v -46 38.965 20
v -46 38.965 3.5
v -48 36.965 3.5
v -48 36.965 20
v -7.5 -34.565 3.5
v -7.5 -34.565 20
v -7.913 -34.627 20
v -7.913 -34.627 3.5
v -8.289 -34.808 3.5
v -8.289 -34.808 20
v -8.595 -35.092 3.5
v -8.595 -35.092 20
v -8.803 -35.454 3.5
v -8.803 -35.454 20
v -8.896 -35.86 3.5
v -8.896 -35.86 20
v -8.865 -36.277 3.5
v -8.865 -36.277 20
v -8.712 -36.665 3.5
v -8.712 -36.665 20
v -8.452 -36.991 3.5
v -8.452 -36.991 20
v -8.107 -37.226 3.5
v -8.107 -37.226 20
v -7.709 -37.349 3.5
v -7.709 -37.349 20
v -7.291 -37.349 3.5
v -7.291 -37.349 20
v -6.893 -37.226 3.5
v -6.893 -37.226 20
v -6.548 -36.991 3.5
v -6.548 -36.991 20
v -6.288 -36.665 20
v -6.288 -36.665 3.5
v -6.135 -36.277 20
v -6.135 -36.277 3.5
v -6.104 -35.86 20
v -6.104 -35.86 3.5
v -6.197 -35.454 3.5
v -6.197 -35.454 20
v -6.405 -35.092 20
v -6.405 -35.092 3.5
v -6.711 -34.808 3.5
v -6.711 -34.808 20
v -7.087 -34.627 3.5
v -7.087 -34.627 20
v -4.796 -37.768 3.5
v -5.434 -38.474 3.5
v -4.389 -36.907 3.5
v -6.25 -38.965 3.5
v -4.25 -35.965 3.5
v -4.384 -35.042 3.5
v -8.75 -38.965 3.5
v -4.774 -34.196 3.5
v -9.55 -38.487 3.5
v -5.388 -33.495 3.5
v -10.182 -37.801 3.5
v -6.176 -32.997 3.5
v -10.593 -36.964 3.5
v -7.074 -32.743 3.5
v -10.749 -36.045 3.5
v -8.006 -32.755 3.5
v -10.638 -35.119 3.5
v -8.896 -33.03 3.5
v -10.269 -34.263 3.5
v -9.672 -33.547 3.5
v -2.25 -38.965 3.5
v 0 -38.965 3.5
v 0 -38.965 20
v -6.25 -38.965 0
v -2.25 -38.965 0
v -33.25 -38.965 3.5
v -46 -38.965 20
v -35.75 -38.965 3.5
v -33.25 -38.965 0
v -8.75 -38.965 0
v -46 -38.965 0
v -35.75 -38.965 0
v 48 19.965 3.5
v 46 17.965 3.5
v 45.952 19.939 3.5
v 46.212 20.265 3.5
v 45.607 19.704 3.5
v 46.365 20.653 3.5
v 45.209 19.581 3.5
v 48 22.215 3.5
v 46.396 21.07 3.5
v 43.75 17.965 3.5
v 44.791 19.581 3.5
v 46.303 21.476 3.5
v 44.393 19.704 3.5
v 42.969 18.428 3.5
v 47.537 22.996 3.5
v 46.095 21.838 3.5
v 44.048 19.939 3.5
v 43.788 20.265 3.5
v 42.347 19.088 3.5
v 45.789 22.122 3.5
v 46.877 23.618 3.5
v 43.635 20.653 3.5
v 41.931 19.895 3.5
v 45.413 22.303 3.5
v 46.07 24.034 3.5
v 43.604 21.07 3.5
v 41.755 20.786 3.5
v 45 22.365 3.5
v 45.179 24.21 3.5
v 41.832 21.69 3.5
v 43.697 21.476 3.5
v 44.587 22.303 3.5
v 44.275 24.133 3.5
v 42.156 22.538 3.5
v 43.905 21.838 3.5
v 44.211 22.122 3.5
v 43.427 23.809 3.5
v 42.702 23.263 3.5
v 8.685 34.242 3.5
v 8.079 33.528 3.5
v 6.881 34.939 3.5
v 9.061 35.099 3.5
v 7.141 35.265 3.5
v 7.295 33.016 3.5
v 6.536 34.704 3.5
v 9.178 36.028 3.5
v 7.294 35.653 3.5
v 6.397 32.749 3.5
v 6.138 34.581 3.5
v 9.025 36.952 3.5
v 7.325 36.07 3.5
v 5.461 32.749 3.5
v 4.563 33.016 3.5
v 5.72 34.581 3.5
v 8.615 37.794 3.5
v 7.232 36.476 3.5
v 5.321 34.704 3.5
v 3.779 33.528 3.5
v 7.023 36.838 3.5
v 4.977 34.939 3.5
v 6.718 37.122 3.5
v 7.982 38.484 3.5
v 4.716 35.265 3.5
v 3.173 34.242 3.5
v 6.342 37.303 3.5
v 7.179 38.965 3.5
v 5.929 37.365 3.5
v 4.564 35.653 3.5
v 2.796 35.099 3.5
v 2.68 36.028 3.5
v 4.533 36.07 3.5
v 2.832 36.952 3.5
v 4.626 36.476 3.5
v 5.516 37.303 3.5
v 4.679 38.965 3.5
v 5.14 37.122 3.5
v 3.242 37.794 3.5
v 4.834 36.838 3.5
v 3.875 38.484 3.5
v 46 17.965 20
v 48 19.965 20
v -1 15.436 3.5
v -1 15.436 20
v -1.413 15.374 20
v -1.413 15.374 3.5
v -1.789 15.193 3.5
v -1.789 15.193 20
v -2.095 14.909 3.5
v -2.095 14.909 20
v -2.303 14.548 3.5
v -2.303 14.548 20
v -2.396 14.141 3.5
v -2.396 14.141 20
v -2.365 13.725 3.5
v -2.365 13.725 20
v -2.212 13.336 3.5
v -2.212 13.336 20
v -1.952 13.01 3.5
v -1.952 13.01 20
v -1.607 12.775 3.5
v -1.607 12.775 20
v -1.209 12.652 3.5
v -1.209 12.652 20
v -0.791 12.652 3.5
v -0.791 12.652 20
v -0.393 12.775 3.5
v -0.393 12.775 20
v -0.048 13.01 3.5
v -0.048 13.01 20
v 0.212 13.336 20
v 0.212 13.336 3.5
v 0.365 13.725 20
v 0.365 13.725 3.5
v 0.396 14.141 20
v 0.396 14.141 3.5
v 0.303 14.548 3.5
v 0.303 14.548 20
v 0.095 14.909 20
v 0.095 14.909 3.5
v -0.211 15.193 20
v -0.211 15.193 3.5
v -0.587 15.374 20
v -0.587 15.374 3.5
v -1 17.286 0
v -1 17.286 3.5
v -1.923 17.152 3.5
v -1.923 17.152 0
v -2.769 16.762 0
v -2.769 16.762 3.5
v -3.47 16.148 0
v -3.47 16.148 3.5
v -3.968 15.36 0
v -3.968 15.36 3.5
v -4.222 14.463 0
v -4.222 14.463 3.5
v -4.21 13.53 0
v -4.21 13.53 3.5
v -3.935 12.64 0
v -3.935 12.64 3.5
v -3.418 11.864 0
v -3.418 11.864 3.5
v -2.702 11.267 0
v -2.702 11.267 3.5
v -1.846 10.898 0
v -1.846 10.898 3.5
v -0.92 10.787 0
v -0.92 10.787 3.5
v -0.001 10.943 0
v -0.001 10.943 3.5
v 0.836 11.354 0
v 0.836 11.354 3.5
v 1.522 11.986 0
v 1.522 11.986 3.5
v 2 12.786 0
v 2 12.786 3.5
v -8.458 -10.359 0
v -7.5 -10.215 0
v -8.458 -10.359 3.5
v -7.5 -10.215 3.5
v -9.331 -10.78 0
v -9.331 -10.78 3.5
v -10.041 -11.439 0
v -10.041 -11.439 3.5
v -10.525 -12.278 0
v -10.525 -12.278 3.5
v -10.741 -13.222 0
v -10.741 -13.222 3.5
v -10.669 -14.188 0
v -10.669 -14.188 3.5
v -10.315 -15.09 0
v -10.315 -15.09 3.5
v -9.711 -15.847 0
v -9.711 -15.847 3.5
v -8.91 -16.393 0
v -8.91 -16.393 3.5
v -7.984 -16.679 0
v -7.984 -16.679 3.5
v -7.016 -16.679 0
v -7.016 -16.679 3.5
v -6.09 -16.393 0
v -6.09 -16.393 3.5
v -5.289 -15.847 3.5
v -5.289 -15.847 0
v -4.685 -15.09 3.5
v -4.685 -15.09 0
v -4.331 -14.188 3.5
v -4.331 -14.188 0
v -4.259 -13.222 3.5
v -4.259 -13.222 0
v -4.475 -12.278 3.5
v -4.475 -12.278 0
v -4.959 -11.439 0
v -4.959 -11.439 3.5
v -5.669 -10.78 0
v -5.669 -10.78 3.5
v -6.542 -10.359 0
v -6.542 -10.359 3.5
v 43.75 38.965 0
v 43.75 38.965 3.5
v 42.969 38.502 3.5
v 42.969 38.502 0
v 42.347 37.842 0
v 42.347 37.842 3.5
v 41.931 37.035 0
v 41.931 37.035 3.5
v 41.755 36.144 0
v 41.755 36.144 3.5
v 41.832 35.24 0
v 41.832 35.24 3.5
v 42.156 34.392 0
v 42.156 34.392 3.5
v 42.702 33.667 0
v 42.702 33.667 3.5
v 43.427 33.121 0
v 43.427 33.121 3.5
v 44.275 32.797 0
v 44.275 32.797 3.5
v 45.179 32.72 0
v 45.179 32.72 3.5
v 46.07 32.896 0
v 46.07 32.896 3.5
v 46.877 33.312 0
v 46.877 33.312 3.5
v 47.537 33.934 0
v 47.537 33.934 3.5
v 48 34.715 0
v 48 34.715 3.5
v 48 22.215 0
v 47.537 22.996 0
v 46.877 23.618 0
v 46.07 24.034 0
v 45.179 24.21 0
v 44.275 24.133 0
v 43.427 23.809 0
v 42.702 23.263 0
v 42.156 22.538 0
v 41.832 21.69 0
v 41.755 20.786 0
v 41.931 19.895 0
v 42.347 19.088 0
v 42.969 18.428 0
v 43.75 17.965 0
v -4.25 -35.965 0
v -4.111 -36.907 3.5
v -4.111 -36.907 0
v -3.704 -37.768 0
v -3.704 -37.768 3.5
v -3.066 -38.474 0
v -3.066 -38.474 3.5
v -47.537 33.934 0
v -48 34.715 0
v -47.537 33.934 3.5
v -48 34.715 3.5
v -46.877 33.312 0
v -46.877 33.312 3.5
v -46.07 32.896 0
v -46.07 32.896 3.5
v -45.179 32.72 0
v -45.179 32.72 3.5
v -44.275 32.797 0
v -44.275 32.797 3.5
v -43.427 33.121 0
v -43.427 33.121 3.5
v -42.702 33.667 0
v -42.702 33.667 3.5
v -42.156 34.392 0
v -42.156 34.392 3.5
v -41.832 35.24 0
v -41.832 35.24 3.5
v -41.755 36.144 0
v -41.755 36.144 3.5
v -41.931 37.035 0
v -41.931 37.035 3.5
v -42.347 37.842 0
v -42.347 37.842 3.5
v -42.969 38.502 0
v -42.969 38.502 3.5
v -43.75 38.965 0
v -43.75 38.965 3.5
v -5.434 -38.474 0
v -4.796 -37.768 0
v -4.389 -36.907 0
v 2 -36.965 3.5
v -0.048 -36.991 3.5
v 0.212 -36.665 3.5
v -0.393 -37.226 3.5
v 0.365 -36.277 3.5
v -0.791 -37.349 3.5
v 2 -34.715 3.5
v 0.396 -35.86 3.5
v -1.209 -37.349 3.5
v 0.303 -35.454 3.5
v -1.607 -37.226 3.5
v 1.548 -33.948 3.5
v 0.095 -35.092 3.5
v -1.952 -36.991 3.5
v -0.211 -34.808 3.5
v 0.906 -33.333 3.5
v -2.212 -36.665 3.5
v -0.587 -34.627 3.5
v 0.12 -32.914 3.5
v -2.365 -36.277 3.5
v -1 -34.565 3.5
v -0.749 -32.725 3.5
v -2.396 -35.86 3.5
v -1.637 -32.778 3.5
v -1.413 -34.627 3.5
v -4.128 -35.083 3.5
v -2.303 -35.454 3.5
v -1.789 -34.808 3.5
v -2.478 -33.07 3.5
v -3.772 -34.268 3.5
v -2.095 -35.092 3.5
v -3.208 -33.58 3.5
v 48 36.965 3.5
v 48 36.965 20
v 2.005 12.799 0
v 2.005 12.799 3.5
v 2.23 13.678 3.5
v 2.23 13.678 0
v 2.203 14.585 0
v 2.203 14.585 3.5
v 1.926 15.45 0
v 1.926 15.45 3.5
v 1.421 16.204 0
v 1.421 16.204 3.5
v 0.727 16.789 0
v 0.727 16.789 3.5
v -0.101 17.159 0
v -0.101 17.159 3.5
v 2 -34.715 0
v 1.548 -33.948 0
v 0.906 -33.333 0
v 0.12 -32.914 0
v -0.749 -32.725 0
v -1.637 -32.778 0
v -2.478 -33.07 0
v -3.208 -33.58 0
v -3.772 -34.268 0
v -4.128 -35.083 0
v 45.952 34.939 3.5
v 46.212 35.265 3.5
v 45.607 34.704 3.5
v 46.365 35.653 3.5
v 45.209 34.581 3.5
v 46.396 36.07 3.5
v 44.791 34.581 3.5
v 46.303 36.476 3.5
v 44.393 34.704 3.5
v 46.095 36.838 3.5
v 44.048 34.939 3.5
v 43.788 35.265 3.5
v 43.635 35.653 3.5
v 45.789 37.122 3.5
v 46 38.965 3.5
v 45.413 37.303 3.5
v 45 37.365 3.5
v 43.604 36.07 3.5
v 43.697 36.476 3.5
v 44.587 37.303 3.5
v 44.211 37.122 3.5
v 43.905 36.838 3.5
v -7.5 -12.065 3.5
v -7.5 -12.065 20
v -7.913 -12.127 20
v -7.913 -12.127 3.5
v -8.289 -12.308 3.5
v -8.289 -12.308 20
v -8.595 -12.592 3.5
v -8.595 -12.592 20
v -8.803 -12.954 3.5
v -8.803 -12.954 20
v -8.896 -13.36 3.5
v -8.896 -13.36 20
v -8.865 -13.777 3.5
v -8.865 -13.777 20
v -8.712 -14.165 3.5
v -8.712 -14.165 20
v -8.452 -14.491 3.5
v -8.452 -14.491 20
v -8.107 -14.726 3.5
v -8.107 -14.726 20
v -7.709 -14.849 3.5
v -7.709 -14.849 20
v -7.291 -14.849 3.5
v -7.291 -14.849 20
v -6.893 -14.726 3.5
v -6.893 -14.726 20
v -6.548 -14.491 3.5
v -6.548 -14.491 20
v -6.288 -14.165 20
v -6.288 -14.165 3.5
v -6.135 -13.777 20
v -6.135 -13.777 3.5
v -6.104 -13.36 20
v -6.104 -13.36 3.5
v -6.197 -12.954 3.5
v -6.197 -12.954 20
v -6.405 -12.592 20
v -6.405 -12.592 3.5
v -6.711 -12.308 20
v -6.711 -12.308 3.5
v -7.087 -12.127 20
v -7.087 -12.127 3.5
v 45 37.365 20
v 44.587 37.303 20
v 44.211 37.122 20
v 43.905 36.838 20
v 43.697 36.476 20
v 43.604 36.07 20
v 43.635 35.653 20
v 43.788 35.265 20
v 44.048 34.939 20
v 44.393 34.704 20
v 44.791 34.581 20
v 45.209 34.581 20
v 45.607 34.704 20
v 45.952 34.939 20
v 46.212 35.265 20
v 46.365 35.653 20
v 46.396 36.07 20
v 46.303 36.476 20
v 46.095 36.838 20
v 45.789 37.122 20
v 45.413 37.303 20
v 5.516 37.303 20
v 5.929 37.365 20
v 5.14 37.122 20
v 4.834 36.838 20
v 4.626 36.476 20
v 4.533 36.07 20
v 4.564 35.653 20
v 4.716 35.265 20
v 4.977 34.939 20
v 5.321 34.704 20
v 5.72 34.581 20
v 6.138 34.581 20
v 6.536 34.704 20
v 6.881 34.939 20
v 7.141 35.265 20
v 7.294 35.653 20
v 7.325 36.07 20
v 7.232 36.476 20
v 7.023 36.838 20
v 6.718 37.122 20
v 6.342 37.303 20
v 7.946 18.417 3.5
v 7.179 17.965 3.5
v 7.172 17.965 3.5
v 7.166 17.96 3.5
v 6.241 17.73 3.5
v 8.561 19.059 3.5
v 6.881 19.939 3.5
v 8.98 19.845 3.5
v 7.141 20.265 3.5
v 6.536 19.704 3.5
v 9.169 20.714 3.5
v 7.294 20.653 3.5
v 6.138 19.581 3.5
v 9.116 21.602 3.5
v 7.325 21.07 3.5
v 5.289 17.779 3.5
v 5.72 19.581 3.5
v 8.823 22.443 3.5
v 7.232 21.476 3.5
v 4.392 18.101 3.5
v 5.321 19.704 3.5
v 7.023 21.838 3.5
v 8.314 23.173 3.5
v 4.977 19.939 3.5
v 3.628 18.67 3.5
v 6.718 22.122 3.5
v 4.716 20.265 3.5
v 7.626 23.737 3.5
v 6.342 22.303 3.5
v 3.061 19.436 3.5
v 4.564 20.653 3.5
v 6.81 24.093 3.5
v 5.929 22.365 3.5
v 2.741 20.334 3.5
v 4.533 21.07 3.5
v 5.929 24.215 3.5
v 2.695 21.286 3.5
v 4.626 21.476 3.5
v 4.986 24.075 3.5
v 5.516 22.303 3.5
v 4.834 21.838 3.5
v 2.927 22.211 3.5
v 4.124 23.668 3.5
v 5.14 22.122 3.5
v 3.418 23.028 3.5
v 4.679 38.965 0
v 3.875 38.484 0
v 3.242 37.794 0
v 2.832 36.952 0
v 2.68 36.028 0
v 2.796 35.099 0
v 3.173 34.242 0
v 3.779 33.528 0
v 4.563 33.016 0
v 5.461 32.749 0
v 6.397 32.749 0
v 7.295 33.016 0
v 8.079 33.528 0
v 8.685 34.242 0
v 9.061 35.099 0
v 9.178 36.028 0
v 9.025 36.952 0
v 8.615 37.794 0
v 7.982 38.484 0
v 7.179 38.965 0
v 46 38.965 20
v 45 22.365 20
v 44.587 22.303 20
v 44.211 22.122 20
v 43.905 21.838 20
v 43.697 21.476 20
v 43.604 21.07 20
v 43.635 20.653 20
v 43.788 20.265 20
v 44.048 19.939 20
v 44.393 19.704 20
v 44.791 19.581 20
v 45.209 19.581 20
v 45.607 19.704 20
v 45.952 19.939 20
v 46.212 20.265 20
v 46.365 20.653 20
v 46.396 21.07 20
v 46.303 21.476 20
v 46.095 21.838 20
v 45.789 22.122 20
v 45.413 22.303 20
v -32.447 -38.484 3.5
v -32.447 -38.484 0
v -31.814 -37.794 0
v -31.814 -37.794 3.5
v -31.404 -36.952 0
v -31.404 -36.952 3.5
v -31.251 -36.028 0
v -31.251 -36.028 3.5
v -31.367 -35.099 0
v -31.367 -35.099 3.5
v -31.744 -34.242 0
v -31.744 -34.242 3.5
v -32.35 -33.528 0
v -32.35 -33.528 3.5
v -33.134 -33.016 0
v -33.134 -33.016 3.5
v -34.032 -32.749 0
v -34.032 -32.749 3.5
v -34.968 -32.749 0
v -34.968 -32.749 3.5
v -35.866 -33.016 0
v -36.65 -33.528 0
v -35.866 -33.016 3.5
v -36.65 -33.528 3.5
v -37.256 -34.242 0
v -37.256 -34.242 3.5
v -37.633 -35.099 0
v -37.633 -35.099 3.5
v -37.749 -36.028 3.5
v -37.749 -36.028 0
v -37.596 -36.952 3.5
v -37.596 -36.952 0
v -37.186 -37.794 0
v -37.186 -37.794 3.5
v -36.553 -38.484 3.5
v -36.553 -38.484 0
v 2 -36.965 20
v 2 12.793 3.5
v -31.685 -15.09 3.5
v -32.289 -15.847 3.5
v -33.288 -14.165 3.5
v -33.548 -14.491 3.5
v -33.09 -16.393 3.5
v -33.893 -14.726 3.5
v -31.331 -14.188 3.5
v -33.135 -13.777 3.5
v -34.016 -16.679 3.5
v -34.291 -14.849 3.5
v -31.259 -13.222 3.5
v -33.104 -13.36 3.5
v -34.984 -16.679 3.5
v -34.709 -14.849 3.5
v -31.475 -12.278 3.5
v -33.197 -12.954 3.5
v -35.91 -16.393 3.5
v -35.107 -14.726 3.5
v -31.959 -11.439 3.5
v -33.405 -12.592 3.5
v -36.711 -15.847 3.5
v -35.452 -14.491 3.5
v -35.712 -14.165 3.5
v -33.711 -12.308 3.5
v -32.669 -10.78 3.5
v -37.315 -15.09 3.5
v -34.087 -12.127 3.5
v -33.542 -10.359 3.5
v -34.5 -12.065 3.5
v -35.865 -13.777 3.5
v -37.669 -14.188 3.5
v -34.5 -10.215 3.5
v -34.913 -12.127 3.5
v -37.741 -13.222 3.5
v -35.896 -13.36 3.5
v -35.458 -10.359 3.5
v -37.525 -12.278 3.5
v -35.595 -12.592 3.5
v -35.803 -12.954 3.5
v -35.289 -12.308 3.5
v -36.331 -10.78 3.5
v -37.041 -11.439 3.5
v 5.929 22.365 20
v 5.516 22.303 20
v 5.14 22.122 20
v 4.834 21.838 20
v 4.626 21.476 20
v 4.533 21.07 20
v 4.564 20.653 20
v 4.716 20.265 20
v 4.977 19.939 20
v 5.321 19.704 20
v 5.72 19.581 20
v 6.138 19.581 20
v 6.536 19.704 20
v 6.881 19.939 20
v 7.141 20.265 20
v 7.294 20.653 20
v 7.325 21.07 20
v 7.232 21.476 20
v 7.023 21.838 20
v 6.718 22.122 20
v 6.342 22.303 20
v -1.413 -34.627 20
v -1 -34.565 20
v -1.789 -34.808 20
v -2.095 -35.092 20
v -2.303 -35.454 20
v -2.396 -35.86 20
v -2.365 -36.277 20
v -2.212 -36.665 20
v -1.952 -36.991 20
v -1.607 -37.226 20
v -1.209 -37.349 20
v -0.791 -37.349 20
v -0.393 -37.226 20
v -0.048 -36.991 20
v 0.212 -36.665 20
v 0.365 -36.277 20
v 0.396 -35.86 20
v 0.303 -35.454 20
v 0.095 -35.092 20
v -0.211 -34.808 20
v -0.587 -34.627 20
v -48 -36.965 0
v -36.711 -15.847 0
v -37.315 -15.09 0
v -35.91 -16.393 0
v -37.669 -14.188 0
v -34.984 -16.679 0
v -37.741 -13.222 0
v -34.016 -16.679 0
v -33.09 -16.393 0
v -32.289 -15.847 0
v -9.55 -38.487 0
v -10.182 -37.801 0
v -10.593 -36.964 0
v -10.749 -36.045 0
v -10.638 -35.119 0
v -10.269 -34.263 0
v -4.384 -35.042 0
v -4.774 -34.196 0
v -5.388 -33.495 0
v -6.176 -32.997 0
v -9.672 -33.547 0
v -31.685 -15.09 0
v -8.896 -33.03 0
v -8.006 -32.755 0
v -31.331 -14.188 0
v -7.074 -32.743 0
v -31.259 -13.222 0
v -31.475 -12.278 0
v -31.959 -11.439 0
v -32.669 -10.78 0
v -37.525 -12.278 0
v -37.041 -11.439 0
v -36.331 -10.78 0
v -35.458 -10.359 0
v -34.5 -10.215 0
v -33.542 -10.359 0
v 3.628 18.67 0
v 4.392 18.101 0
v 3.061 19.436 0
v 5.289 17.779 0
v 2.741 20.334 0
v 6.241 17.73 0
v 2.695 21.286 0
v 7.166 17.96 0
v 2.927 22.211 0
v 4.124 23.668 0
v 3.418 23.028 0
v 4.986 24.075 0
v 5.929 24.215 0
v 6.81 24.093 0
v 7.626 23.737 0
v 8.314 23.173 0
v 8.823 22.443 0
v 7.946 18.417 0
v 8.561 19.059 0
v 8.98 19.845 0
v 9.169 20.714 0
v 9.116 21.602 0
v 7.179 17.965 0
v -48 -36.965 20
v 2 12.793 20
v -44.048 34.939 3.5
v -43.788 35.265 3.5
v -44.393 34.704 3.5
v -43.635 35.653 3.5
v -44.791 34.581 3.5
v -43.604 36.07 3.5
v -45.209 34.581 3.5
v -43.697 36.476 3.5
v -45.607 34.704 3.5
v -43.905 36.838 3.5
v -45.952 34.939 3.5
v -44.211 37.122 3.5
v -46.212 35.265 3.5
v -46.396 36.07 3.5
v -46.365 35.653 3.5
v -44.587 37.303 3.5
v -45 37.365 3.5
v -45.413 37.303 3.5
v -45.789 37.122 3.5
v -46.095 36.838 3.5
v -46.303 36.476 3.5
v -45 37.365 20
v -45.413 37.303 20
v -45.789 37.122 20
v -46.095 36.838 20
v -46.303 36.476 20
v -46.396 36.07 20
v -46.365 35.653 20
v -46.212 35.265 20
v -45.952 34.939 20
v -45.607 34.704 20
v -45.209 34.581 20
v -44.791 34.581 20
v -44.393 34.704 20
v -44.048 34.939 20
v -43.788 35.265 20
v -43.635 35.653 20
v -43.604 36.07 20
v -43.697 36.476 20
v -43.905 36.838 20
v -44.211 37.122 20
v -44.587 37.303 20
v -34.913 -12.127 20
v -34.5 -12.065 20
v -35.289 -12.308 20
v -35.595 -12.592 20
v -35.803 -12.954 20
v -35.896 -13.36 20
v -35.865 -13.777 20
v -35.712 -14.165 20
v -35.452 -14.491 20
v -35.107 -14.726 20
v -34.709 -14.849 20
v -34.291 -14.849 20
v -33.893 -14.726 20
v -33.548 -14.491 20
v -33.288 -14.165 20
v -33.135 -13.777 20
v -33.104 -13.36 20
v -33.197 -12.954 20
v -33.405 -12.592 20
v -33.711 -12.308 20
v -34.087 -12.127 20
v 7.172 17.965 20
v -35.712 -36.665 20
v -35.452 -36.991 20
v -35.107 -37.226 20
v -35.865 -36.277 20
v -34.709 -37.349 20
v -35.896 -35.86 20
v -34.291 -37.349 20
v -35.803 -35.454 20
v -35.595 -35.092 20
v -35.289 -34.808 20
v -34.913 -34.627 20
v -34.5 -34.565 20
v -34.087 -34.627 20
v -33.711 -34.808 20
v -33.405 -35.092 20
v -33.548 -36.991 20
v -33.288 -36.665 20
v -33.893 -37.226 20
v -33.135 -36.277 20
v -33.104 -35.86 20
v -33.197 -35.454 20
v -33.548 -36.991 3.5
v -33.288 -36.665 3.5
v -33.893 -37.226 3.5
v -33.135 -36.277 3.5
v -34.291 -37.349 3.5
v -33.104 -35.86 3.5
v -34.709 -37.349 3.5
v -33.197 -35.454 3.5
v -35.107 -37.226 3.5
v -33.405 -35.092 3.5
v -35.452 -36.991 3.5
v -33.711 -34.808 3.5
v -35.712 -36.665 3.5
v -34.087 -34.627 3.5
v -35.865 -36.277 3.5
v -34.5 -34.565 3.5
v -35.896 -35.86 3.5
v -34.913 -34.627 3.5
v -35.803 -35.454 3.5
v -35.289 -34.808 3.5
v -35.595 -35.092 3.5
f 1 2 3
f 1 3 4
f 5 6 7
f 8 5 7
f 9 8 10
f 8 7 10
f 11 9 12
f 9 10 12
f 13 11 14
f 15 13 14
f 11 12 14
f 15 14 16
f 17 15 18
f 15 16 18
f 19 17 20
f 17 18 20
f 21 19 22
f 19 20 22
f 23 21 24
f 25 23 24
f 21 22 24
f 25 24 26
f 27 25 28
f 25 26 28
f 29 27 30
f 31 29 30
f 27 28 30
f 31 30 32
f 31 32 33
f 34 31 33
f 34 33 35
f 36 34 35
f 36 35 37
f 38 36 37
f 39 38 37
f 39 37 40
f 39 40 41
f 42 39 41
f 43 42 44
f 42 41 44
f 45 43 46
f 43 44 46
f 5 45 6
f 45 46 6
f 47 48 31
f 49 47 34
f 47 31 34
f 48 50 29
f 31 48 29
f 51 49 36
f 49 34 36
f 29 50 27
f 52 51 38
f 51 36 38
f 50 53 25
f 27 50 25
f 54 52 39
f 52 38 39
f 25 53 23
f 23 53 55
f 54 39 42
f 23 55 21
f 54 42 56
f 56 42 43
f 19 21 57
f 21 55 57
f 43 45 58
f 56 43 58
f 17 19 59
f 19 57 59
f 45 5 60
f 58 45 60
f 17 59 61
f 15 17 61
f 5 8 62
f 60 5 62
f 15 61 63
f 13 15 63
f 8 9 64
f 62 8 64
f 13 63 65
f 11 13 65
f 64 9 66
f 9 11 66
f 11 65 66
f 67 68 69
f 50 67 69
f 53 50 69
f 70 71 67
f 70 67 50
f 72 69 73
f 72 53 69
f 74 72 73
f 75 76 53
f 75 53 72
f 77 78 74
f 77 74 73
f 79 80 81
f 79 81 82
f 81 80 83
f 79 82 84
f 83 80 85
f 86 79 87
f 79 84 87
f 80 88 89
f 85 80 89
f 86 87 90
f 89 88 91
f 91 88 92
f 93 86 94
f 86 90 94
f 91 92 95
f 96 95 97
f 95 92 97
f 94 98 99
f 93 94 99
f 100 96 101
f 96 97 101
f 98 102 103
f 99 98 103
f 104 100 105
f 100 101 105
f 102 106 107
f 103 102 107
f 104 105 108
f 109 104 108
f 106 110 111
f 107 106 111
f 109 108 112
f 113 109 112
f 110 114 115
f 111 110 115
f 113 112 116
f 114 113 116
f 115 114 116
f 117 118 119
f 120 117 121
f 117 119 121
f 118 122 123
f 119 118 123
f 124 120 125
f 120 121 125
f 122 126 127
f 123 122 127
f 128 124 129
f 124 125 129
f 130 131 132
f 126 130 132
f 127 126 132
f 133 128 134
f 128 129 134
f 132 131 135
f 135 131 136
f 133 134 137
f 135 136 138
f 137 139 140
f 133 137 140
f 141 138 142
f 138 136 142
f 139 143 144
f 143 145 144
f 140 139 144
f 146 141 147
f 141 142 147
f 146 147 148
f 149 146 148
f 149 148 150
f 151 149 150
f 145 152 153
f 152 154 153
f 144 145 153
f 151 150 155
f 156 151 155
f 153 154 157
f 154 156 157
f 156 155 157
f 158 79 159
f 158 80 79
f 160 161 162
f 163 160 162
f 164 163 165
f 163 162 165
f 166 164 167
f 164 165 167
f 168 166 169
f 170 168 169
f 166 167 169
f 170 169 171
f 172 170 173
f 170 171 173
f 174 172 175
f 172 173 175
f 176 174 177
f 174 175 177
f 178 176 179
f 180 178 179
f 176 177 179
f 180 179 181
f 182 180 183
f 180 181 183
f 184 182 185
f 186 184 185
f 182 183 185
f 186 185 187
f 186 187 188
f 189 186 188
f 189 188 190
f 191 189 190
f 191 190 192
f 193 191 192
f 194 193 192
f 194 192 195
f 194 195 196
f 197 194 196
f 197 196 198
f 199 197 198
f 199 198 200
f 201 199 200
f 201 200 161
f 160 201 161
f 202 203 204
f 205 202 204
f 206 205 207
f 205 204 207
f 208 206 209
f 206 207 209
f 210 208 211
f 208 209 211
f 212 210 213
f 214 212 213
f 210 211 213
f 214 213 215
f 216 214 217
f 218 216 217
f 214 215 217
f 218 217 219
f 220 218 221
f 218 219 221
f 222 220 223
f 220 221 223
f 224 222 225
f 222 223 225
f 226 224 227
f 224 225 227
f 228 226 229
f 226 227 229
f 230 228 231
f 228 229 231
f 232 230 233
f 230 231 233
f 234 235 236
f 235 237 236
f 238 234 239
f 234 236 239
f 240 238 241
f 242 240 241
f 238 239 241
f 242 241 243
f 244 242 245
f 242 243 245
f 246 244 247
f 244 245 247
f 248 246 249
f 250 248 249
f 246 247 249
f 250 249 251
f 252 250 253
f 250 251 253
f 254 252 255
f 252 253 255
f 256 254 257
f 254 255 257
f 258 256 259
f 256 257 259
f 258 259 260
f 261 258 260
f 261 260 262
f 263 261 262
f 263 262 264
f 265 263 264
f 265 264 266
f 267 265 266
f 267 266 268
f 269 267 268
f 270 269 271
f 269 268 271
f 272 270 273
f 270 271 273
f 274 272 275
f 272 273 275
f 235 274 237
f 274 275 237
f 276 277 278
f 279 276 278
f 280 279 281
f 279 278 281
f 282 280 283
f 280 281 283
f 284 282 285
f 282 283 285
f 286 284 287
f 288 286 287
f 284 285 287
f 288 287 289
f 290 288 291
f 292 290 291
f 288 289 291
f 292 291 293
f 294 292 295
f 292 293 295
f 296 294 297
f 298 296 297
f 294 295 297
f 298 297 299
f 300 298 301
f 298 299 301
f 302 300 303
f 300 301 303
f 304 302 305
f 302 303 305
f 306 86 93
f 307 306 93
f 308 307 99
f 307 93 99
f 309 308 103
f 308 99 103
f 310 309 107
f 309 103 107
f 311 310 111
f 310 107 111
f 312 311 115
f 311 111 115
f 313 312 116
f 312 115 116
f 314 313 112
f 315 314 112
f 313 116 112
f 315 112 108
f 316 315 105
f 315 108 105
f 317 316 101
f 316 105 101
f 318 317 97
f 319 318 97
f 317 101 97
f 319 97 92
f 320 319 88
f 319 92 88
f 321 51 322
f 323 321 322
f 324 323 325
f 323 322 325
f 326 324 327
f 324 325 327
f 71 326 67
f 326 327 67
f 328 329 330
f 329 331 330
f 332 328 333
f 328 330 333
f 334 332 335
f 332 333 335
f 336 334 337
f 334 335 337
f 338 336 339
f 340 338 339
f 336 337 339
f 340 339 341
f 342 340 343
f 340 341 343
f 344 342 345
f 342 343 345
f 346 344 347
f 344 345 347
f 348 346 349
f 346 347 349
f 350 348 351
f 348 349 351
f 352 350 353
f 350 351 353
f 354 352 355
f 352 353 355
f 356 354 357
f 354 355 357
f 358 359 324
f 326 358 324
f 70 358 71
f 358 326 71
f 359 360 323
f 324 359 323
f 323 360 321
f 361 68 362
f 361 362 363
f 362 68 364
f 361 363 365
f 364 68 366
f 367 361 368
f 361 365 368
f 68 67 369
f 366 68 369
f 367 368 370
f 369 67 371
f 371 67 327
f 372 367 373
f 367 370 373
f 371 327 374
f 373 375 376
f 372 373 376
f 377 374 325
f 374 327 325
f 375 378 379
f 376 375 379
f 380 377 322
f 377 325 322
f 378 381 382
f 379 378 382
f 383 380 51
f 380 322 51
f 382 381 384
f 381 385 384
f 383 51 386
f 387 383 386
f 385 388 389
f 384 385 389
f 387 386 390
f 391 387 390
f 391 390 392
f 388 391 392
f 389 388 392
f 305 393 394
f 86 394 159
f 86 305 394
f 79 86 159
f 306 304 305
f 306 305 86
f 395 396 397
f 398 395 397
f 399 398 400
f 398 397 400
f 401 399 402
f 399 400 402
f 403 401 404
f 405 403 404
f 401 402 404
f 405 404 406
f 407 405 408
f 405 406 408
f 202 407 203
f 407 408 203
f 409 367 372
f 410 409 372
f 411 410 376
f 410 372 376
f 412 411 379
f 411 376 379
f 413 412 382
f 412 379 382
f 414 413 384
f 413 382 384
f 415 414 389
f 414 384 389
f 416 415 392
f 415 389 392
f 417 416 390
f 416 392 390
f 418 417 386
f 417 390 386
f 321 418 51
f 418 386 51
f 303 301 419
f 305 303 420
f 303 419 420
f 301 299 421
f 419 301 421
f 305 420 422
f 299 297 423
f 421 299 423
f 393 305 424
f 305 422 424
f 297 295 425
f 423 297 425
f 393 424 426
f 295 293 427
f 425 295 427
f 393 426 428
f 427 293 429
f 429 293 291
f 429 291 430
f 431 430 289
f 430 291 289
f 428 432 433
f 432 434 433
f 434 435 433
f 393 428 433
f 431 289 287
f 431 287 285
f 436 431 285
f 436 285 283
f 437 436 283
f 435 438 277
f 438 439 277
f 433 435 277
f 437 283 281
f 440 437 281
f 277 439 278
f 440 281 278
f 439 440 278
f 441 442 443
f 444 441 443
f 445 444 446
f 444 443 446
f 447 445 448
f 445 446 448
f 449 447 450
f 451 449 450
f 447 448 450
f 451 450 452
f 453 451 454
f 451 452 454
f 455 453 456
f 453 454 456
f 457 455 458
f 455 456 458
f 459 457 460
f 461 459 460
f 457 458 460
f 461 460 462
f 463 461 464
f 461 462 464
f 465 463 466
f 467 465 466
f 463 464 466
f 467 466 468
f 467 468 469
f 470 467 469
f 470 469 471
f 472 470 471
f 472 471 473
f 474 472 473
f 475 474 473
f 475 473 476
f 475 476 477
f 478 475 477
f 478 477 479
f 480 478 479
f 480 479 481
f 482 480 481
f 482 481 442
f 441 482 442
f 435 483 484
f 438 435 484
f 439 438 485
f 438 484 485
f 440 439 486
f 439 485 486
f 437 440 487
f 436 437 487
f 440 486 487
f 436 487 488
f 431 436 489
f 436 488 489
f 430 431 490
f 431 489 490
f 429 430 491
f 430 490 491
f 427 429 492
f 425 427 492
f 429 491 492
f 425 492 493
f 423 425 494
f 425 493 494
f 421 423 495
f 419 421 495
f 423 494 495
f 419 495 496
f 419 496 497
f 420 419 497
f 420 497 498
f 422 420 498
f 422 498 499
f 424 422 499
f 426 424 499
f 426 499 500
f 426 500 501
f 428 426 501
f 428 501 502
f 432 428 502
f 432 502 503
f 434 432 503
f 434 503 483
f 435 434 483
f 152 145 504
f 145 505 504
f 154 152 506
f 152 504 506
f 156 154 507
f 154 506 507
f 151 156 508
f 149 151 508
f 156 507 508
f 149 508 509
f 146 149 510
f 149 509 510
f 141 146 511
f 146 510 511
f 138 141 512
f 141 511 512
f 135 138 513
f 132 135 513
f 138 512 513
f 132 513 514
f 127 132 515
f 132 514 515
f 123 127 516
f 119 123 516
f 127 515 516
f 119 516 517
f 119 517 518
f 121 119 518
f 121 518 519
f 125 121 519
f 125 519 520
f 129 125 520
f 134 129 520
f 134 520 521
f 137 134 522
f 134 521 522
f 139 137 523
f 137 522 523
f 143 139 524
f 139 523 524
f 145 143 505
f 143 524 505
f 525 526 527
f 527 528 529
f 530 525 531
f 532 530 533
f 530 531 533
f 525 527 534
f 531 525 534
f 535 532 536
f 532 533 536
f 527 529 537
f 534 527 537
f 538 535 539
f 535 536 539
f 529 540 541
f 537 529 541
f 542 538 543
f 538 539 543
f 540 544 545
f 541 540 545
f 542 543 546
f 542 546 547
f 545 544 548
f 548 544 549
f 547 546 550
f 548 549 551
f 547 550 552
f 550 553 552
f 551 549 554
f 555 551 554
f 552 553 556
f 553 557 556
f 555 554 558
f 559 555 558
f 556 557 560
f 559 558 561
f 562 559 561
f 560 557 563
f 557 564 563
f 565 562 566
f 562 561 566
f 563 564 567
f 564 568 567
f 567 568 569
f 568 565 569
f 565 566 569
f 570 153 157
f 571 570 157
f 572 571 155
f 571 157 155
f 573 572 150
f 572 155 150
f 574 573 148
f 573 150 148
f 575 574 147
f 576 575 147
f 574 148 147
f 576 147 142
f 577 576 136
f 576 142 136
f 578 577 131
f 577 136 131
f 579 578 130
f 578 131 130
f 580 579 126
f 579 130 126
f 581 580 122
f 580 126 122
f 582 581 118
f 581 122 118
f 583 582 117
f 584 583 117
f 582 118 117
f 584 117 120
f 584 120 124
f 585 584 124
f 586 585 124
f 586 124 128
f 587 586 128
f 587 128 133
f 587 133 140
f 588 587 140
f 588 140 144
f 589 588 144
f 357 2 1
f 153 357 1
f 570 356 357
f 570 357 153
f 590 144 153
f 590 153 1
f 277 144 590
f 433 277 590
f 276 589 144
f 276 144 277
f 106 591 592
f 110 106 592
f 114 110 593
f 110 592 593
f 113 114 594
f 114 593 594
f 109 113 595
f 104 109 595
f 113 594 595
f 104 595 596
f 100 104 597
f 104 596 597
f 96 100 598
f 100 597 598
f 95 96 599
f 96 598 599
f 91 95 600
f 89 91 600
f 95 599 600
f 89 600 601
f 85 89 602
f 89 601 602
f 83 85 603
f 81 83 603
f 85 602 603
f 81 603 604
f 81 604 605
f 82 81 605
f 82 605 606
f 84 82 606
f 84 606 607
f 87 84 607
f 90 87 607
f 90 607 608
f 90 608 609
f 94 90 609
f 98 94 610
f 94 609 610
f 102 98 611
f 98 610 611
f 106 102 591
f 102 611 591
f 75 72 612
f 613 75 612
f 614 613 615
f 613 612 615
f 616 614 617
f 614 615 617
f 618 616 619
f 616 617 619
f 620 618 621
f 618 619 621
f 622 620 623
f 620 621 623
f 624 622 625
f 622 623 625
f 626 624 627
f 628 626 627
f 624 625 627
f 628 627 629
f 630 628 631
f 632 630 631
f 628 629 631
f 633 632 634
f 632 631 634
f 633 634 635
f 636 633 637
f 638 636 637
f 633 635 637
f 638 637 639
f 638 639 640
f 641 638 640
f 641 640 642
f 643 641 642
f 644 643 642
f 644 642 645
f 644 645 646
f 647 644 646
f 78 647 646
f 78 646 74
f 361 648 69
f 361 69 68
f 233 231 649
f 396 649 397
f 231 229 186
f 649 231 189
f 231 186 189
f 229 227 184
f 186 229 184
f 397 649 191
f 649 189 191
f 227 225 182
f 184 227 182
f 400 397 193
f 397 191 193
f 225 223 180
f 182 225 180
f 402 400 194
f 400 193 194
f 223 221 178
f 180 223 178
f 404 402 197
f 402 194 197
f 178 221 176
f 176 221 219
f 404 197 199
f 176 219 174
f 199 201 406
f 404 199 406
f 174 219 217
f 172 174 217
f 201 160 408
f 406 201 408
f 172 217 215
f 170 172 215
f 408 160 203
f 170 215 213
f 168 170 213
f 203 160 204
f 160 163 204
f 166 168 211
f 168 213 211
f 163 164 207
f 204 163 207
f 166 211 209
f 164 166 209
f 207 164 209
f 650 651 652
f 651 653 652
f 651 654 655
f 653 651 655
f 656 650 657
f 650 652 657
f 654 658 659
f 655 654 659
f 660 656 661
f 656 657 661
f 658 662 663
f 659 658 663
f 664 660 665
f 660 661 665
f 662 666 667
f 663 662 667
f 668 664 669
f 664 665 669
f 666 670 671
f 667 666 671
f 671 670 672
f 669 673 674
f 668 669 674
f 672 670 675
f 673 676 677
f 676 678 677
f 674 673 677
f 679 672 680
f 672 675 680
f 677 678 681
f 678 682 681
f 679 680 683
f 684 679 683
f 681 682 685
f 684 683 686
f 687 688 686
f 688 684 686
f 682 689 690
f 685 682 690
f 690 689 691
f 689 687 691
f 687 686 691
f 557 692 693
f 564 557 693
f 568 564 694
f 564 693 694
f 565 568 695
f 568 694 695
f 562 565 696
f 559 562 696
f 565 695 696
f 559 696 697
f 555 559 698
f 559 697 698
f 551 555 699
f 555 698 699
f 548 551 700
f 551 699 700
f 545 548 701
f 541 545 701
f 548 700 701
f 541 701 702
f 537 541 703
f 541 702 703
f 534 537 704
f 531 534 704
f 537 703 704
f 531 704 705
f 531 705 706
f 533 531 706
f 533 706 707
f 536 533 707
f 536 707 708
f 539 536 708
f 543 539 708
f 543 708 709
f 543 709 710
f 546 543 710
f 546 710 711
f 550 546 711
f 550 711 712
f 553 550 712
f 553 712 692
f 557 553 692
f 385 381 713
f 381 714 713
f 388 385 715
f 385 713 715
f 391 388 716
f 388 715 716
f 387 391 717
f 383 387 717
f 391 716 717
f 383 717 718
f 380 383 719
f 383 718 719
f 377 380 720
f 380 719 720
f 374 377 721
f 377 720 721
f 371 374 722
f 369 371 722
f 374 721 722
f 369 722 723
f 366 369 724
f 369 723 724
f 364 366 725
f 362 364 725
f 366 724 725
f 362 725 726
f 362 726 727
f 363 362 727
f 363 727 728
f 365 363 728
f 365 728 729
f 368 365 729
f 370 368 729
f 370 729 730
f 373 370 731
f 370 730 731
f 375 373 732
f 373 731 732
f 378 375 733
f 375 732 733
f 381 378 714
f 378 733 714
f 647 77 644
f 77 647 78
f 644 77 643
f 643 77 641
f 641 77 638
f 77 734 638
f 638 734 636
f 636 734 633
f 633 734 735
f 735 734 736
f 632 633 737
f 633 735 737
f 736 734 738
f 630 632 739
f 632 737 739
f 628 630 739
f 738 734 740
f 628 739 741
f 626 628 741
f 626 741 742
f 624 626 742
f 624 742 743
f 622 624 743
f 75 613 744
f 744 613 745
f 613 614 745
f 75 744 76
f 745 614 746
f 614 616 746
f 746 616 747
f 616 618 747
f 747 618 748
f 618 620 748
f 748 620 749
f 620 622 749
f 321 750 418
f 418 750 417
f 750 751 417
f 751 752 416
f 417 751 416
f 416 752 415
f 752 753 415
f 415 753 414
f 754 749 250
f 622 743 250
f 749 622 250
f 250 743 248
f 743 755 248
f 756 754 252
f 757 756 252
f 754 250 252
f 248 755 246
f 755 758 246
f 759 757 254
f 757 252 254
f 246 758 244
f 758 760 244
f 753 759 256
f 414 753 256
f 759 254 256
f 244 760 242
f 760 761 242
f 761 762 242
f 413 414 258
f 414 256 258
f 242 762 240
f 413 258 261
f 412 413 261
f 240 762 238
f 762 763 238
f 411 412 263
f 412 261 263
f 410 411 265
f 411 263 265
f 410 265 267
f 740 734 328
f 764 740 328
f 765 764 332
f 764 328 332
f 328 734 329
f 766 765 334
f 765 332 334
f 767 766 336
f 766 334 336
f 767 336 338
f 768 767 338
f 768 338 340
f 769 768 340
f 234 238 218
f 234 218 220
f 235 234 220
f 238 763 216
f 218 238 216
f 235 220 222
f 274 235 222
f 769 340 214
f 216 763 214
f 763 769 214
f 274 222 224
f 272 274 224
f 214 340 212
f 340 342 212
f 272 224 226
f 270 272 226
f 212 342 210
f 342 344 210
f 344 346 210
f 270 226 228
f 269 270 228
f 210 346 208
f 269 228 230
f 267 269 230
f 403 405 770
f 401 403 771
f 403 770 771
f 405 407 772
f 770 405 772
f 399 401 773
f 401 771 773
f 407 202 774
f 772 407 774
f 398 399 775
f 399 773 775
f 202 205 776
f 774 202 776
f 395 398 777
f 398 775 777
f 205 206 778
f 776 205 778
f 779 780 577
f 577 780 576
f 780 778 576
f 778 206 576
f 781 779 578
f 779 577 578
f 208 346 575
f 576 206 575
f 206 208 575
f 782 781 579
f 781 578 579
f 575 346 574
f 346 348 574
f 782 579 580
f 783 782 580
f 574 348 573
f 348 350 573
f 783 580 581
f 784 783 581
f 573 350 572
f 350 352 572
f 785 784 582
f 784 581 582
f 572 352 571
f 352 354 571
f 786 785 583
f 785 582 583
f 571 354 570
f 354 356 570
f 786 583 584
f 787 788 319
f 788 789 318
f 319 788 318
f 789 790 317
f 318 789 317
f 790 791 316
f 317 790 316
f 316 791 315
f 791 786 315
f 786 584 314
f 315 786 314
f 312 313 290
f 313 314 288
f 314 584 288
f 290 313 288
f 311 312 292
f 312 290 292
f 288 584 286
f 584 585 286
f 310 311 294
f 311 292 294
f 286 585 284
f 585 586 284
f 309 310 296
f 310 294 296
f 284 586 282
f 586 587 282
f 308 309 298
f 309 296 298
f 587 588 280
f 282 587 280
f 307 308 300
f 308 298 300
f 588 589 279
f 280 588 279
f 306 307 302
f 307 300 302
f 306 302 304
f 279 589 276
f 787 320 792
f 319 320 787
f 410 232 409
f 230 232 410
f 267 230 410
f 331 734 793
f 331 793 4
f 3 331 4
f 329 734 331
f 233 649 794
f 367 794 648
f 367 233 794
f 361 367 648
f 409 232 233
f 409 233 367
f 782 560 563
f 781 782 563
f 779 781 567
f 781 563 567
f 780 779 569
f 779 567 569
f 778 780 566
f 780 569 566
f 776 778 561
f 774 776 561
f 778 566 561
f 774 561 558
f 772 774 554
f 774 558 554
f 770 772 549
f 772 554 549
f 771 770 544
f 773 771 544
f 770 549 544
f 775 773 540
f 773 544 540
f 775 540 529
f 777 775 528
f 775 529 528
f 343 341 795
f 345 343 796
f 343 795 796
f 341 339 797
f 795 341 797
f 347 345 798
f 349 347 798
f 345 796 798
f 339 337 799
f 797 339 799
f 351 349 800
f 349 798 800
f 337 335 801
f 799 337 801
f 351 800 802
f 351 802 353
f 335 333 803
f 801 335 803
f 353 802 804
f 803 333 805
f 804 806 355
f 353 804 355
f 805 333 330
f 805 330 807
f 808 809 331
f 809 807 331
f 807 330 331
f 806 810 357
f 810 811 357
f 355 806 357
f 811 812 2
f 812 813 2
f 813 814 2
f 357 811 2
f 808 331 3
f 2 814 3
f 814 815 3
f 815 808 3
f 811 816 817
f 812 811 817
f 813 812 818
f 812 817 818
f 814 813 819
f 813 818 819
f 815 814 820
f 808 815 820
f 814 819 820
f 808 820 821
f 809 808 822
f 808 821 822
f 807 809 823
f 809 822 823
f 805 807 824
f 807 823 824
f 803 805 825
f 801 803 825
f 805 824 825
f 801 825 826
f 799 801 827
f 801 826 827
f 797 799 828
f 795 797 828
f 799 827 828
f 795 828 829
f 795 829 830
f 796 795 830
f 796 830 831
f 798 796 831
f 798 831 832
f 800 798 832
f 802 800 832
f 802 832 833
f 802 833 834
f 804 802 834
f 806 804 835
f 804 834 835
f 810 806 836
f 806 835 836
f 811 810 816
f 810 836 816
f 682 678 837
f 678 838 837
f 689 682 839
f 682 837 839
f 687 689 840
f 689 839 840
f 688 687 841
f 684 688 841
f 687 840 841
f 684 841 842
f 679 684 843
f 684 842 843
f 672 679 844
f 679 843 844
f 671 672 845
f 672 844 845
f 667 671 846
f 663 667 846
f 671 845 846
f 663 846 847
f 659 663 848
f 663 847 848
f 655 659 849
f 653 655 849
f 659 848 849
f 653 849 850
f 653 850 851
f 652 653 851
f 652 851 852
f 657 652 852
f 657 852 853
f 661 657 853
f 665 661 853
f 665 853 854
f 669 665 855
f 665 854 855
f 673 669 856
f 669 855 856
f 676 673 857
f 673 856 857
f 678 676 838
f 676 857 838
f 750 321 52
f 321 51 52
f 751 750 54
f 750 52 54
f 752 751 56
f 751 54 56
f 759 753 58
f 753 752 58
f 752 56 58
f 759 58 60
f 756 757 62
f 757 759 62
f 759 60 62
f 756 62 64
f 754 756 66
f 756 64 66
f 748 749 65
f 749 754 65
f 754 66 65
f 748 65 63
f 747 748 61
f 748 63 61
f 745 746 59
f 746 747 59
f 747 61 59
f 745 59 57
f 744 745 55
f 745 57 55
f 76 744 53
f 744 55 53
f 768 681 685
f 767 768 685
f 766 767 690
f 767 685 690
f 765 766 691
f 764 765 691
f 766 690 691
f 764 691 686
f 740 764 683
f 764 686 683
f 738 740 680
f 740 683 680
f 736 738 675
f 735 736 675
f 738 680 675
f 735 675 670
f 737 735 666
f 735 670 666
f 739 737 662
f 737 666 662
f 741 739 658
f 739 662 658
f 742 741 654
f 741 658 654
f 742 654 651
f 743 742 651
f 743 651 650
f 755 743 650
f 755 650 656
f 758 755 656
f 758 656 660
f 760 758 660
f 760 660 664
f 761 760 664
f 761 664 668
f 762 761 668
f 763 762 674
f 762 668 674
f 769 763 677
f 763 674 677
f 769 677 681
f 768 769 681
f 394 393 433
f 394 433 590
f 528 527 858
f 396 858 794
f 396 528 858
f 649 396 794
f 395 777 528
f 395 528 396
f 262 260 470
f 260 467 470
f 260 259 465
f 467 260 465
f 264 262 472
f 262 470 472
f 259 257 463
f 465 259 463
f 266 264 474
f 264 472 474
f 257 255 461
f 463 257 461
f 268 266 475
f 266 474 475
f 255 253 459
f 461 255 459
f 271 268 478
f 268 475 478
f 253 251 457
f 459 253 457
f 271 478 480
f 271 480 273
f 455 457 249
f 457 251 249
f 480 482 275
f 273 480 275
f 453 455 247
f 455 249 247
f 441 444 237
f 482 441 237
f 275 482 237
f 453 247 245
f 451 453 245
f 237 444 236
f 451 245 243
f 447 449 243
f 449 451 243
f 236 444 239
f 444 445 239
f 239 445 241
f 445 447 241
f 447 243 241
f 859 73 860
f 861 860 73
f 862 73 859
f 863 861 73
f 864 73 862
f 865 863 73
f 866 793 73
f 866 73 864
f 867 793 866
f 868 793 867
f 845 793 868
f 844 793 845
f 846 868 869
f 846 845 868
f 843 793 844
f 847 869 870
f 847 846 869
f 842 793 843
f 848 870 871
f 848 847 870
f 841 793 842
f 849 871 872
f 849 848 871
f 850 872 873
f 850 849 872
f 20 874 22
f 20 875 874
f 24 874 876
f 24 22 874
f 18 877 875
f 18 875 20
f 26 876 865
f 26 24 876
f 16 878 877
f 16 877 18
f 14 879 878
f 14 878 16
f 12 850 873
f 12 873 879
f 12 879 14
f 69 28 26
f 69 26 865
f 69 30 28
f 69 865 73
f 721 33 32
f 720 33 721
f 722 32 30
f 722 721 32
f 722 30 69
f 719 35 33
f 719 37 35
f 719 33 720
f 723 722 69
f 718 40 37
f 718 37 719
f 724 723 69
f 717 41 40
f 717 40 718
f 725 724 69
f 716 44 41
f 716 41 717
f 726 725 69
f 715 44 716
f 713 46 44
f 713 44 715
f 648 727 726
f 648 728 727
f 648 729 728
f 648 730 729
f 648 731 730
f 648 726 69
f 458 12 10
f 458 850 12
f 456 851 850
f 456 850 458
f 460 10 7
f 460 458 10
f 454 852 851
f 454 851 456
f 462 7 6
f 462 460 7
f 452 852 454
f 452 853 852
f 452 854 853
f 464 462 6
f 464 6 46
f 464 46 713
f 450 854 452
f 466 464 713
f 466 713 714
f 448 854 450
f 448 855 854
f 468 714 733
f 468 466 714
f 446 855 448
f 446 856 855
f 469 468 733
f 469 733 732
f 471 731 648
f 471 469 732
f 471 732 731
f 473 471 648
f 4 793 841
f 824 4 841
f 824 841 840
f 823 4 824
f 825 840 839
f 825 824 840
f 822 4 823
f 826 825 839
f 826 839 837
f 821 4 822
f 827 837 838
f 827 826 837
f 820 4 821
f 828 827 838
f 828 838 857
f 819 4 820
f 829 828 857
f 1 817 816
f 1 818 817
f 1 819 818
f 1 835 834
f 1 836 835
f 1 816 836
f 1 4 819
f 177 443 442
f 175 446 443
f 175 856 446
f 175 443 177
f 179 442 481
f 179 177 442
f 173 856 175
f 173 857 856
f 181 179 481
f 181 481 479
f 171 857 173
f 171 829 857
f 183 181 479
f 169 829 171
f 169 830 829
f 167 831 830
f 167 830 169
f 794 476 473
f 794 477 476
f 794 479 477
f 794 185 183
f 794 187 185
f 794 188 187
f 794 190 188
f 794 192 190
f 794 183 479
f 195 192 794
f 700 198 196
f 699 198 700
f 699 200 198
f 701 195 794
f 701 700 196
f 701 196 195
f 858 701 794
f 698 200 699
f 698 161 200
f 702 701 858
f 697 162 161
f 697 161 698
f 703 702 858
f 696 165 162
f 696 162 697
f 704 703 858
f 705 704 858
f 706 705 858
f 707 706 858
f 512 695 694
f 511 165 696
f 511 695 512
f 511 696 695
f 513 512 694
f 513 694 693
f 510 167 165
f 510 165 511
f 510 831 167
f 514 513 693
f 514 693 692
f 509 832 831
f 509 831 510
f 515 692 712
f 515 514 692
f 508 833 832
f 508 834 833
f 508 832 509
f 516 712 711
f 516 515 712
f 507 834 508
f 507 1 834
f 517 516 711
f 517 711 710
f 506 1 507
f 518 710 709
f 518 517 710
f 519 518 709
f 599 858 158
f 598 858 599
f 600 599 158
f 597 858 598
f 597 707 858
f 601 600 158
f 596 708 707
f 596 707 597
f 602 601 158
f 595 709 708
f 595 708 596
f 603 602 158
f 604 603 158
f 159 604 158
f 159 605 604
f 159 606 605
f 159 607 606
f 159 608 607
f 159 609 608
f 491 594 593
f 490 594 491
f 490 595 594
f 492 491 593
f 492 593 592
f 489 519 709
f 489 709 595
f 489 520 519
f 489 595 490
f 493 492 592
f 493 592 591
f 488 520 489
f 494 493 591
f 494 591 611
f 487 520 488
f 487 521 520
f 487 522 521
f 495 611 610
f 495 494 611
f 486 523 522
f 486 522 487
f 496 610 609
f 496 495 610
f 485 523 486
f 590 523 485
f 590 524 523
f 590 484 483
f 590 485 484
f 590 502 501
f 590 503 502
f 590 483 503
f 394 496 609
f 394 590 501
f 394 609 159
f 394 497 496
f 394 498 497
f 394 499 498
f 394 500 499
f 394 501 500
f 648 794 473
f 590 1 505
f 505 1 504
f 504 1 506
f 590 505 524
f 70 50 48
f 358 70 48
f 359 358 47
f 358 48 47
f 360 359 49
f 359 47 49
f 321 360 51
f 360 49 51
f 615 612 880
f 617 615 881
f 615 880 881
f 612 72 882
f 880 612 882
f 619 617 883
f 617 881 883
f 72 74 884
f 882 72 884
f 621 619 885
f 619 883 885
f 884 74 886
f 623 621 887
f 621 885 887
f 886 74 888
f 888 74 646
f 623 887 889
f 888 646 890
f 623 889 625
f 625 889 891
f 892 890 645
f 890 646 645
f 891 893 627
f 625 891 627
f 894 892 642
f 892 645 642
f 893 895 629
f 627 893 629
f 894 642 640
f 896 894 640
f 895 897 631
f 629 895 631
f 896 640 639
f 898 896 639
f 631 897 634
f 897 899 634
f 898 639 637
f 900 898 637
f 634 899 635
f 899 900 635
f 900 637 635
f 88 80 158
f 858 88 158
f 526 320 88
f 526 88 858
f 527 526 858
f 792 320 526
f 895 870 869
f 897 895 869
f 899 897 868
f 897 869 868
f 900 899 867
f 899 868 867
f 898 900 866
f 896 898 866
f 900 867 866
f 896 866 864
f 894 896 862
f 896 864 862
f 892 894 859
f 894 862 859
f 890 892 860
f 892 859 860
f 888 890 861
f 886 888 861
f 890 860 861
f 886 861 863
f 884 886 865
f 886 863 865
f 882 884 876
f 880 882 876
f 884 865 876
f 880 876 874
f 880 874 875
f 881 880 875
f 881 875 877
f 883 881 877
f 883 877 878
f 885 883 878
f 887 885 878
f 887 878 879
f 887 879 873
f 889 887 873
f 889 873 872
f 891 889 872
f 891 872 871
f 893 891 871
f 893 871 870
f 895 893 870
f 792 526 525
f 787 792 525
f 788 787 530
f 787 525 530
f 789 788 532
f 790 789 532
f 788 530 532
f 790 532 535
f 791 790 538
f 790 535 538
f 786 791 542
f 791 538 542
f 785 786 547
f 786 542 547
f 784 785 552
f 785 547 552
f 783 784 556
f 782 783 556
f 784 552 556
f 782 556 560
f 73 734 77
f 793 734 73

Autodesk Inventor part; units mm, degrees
ref_plane "YZ Plane" through (0, 0, 0) normal (1, 0, 0) x (0, 1, 0)
ref_plane "XZ Plane" through (0, 0, 0) normal (0, 1, 0) x (-1, 0, 0)
ref_plane "Arbeitsebene1" through (0, 0, 0) normal (0, 0, 1) x (1, 0, 0)
ref_plane "Arbeitsebene2" through (-65, -116.035, 20) normal (0, 0, -1) x (0, 1, 0)
sketch "Skizze1" plane through (0, 0, 0) normal (0, 0, 1) x (1, 0, 0)
  circle A0 centre (-21, -24.715) radius 10 projected
  circle A1 centre (-34.5, -13.465) radius 2 projected
  circle A2 centre (-7.5, -13.465) radius 2 projected
  circle A3 centre (-7.5, -35.965) radius 2 projected
  circle A4 centre (-34.5, -35.965) radius 2 projected
  circle A5 centre (-45, 35.965) radius 2 projected
  circle A6 centre (-1, -35.965) radius 2 projected
  circle A7 centre (-1, 14.0361) radius 2 projected
  circle A8 centre (45, 35.965) radius 2 projected
  circle A9 centre (45, 20.965) radius 2 projected
  circle A10 centre (5.9289, 20.965) radius 2 projected
  circle A11 centre (5.9289, 35.965) radius 2 projected
  line L0 (2, -38.965) -> (-48, -38.965) projected
  line L1 (-48, -38.965) -> (-48, 38.965) projected
  line L2 (-48, 38.965) -> (48, 38.965) projected
  line L3 (48, 38.965) -> (48, 17.965) projected
  line L4 (48, 17.965) -> (7.1716, 17.965) projected
  line L5 (7.1716, 17.965) -> (2, 12.7934) projected
  line L6 (2, 12.7934) -> (2, -38.965) projected
  point P0 (0, 0)
extrude "Extrusion1" add sketch "Skizze1" along normal up to surface (20 mm away) contours A0 | A1 | A2 | A3 | A4 | A5 | A6 | A7 | A8 | A9 | A10 | A11 | L0 L1 L2 L3 L4 L5 L6
chamfer "Fasen1" distance 2 angle 45 5 edges at (-48, 38.965, 10) (-48, -38.965, 10) (48, 38.965, 10) (48, 17.965, 10) (2, -38.965, 10)
sketch "Skizze2" plane through (0, 0, 0) normal (0, 0, -1) x (-1, 0, 0)
  circle A0 centre (21, -24.715) radius 10 projected
  circle A1 centre (34.5, -13.465) radius 2 projected
  circle A2 centre (7.5, -13.465) radius 2 projected
  circle A3 centre (7.5, -35.965) radius 2 projected
  circle A4 centre (34.5, -35.965) radius 2 projected
  circle A5 centre (45, 35.965) radius 2 projected
  circle A6 centre (1, -35.965) radius 2 projected
  circle A7 centre (1, 14.0361) radius 2 projected
  circle A8 centre (-45, 35.965) radius 2 projected
  circle A9 centre (-45, 20.965) radius 2 projected
  circle A10 centre (-5.9289, 20.965) radius 2 projected
  circle A11 centre (-5.9289, 35.965) radius 2 projected
  line L0 (-2, -38.965) -> (48, -38.965) projected
  line L1 (48, -38.965) -> (48, 38.965) projected
  line L2 (48, 38.965) -> (-48, 38.965) projected
  line L3 (-48, 38.965) -> (-48, 17.965) projected
  line L4 (-48, 17.965) -> (-7.1716, 17.965) projected
  line L5 (-7.1716, 17.965) -> (-2, 12.7934) projected
  line L6 (-2, 12.7934) -> (-2, -38.965) projected
  point P0 (0, 0)
hole "Bohrung1" at (45, 35.965, 0) at (5.9289, 35.965, 0) at (5.9289, 20.965, 0) at (-1, 14.0361, 0) at (45, 20.965, 0) at (-45, 35.965, 0) at (-7.5, -13.465, 0) at (-34.5, -13.465, 0) at (-34.5, -35.965, 0) at (-7.5, -35.965, 0) at (-1, -35.965, 0) direction (0, 0, 1) diameter 2.8 depth 20 counterbore diameter 6.5 counterbore depth 3.5
properties part number "MIAB_Spacer"
